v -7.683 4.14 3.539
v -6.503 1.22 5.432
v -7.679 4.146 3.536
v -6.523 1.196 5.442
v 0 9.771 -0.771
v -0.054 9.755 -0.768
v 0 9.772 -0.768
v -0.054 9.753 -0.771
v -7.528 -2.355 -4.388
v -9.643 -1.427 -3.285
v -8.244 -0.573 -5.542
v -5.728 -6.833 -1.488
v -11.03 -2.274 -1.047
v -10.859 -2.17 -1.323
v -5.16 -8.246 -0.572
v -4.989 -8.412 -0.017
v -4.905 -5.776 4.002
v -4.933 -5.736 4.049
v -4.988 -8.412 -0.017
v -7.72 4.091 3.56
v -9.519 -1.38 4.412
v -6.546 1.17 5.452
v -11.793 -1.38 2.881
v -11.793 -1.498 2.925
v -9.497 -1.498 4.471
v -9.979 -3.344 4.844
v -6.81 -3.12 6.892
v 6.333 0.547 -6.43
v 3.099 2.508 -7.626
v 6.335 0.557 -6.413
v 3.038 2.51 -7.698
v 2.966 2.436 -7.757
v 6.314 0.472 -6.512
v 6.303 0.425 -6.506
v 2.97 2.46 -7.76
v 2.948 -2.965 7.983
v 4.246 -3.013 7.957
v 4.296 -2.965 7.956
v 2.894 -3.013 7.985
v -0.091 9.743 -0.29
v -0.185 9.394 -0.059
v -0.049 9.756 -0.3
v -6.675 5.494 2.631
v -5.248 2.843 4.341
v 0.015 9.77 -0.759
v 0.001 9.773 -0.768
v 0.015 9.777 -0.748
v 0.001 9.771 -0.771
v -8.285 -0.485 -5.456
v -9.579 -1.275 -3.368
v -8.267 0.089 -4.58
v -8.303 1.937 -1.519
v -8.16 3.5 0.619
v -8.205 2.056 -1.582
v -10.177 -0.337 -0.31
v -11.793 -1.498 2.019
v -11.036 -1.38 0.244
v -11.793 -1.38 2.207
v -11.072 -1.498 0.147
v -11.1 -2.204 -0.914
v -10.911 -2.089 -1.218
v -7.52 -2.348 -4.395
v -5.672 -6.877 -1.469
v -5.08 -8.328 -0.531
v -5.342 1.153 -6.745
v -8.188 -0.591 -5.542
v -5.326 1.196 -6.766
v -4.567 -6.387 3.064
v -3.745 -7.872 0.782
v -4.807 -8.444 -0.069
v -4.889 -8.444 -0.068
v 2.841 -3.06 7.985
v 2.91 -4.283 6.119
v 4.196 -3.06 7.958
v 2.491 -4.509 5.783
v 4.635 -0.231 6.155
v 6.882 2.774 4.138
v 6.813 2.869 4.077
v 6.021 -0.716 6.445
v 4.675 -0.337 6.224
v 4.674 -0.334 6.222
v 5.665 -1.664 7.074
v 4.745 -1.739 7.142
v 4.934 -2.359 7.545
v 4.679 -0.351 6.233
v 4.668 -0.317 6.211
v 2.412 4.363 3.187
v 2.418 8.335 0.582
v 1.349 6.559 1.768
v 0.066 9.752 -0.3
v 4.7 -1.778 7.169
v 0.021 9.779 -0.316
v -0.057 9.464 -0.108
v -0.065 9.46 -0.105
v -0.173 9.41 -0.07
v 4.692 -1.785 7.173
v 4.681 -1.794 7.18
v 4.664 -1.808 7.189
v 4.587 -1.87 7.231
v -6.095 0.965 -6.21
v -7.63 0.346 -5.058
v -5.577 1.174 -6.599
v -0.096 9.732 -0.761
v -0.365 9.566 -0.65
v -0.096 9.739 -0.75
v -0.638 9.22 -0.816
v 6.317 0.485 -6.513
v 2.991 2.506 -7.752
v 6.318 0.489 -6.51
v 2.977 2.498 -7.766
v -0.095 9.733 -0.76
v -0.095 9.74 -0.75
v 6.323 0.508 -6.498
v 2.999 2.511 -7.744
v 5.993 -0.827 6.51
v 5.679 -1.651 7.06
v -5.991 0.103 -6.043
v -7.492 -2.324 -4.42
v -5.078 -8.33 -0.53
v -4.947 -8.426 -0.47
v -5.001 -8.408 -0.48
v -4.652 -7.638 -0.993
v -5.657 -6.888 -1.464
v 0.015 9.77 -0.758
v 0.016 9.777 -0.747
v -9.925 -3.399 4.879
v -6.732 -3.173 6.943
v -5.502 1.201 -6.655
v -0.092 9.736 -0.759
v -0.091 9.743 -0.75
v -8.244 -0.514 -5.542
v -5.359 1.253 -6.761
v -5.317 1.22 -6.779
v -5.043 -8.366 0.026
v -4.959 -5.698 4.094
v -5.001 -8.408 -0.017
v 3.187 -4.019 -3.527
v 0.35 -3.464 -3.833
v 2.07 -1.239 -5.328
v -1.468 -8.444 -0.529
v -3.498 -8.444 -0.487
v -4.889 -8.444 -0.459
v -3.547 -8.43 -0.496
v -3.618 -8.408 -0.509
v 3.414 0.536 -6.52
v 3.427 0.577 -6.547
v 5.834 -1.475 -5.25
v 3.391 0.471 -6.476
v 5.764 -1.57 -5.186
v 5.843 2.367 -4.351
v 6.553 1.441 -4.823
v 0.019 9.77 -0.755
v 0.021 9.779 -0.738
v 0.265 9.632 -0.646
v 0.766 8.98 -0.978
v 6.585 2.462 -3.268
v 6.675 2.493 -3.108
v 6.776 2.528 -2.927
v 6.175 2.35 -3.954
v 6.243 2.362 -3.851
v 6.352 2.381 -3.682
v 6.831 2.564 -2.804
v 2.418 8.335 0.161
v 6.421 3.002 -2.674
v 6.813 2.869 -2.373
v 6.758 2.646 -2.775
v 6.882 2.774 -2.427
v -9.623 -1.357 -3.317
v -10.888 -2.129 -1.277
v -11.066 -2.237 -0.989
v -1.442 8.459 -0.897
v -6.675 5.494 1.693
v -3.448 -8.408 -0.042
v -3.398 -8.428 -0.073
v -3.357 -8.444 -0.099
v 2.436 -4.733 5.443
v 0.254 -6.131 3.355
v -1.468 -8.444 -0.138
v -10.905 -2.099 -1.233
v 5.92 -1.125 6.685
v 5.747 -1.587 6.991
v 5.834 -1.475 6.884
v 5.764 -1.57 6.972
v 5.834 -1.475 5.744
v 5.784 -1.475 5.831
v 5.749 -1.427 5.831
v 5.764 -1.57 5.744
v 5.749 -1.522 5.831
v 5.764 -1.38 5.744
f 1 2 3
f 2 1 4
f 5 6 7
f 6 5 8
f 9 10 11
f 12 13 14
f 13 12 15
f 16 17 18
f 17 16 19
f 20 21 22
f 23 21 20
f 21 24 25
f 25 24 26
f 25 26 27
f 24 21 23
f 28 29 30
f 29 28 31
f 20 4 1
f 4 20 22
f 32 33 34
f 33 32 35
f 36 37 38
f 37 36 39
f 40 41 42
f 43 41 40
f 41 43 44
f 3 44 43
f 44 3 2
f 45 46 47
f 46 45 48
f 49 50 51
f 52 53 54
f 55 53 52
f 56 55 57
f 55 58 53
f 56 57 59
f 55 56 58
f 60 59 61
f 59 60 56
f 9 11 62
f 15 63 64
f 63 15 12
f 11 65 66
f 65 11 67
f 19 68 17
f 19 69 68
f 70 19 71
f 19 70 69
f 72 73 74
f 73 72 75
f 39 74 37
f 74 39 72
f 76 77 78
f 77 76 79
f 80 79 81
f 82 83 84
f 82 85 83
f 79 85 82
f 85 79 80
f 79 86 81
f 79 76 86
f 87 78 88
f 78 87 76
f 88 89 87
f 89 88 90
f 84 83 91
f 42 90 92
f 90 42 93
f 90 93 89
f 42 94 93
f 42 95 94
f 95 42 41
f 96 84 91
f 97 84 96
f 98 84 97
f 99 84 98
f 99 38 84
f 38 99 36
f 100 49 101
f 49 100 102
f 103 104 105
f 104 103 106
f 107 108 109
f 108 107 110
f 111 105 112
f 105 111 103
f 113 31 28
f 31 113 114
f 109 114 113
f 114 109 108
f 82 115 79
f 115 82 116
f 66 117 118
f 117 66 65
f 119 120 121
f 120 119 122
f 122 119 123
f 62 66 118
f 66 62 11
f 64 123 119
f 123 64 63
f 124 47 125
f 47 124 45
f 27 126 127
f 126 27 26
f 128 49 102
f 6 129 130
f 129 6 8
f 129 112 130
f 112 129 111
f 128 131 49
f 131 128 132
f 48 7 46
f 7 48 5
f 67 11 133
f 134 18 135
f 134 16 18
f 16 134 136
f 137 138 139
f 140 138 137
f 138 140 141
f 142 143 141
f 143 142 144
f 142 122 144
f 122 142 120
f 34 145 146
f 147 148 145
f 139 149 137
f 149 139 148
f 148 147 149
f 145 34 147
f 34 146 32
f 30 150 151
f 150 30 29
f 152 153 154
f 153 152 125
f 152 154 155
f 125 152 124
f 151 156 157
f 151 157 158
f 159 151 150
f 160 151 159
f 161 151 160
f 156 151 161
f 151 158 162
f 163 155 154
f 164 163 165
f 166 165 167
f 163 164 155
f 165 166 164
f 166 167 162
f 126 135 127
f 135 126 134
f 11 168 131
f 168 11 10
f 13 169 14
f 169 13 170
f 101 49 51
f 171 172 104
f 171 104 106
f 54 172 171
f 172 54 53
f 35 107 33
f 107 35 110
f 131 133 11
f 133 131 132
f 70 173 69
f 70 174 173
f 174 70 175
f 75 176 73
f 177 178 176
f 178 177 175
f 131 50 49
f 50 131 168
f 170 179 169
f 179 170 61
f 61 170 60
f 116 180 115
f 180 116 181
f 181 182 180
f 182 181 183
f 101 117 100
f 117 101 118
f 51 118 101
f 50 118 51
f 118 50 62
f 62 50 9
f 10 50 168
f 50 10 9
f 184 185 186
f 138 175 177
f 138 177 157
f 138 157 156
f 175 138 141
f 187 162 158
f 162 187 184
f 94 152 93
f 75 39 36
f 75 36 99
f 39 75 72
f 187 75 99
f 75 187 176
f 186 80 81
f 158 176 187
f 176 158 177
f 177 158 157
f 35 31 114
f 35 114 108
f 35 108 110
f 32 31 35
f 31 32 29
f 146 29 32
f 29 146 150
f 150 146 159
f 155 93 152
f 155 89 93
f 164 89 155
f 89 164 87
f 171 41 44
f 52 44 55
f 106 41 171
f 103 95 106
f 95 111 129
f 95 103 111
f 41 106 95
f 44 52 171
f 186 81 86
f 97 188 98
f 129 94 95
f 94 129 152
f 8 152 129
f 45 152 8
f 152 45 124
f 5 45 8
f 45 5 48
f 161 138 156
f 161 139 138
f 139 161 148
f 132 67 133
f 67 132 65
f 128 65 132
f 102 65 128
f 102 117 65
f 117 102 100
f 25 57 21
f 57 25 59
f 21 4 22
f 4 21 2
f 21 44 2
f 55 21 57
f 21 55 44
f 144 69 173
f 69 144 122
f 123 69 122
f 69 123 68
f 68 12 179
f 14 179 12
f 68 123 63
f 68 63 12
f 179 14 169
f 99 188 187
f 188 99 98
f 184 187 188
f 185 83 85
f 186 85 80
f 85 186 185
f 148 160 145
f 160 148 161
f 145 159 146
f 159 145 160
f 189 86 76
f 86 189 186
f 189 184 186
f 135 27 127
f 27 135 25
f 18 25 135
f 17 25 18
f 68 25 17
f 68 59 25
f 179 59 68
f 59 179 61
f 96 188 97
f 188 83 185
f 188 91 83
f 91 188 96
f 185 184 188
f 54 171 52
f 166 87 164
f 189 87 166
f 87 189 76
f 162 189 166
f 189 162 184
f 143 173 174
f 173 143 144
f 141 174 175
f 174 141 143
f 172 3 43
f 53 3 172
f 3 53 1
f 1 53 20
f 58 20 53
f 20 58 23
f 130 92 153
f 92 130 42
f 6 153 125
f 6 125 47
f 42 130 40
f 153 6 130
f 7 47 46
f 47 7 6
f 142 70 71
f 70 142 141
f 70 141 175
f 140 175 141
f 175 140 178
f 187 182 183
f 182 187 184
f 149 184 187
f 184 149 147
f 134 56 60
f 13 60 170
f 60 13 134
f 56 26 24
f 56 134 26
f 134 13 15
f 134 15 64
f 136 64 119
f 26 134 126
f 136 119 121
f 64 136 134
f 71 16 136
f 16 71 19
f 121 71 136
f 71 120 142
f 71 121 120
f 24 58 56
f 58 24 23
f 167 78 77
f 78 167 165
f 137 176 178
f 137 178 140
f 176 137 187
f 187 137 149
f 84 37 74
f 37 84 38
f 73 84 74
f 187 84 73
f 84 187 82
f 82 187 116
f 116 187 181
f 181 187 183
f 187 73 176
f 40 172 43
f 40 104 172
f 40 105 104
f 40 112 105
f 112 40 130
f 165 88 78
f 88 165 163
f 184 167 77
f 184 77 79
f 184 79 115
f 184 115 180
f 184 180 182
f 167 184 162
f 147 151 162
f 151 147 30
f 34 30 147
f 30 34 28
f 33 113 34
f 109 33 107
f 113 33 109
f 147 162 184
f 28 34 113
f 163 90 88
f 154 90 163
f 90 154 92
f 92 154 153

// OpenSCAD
// Auto-generated OpenSCAD file

    inner_points = 10*[[0.019787791635657748, -0.14747479922424916, -0.945991098230778], [-0.6594221428128932, 0.5435520084277206, -0.6986940783281456], [-0.14991280650270666, -0.8349261534325039, 0.5088787692620549], [-0.8291227409512576, -0.14389934578053432, 0.7561757891646873], [0.678236401517591, 0.27739350328859563, -0.3247565582505837], [-0.0009735329309600027, 0.9684203109405655, -0.07745953834795122], [0.5733556639568946, -0.1474747992242489, 0.5744024690680427], [-0.10585427049165638, 0.5435520084277209, 0.8216994889706752], [-0.49203656667719314, -0.8349261534325041, -0.430776131605317], [-1.171246501125744, -0.14389934578053443, -0.18347911170268458], [0.2386660365849197, 0.823975401935654, -1.03751607052968], [-0.039688911151111894, -0.3036310288659764, 1.3488645926575207]];

    outer_points = 10*[[-0.8032370415536442, 0.4940095944296054, 0.2904678526749993], [-0.8203617651133189, -0.05438177544706052, -0.5455785869967444], [0.8144576288440243, 0.4940095944296054, 0.257332643050285], [0.7973329052843495, -0.05438177544706052, -0.5787137966214586], [-0.4836041683692091, -0.30128460130981144, 0.8055814019076486], [-0.5007288919288839, -0.8496759711864774, -0.030465037764095003], [0.5161861213561083, -0.30128460130981144, 0.7851027161352226], [0.4990613977964336, -0.8496759711864774, -0.05094372353652105], [-0.0009907313780924036, 0.9855284384520768, -0.04836851458879643], [-0.01811545493776716, 0.43713706857541085, -0.8844149542605402], [-1.321886530779726, -0.3605543525439317, 0.26357607217362455], [1.3315709135143465, -0.3605543525439317, 0.20922535305718643]];

    // Convex hull for inner set (I)
    module inner_hull() {
        hull() {
            for (p = inner_points) {
                translate(p) sphere(r=0.1);
            }
        }
    }

    // Convex hull for outer set (O) minus inner hull (O \ I)
    module outer_minus_inner() {
        difference() {
            hull() {
                for (p = outer_points) {
                    translate(p) sphere(r=0.1);
                }
            }
            inner_hull(); // Subtract inner hull
        }
    }

    // Convex hull for outer set (O) minus all translated inner hulls
    module outer_minus_AllTranslationInner() {
        difference() {
            hull() {
                for (p = outer_points) {
                    translate(p) sphere(r=0.1);
                }
            }
            hull() {
                translate([0,0,50]) inner_hull();
                translate([0,0,-50]) inner_hull();
            }; // Subtract translated inner hulls
        }
    }

    // Difference between outer_minus_inner and outer_minus_AllTranslationInner
    module outer_minus_inner_diff() {
        difference() {
            // Outer minus inner
            difference() {
                hull() {
                    for (p = outer_points) {
                        translate(p) sphere(r=0.1);
                    }
                }
                inner_hull();
            }

            // Subtract Outer minus AllTranslationInner
            difference() {
                hull() {
                    for (p = outer_points) {
                        translate(p) sphere(r=0.1);
                    }
                }
                hull() {
                    translate([0,0,50]) inner_hull();
                    translate([0,0,-50]) inner_hull();
                };
            }
        }
    }

    // Rendering all with colors applied
    color([1, 1, 0, 1]) outer_minus_inner_diff(); // Opaque yellow
    
